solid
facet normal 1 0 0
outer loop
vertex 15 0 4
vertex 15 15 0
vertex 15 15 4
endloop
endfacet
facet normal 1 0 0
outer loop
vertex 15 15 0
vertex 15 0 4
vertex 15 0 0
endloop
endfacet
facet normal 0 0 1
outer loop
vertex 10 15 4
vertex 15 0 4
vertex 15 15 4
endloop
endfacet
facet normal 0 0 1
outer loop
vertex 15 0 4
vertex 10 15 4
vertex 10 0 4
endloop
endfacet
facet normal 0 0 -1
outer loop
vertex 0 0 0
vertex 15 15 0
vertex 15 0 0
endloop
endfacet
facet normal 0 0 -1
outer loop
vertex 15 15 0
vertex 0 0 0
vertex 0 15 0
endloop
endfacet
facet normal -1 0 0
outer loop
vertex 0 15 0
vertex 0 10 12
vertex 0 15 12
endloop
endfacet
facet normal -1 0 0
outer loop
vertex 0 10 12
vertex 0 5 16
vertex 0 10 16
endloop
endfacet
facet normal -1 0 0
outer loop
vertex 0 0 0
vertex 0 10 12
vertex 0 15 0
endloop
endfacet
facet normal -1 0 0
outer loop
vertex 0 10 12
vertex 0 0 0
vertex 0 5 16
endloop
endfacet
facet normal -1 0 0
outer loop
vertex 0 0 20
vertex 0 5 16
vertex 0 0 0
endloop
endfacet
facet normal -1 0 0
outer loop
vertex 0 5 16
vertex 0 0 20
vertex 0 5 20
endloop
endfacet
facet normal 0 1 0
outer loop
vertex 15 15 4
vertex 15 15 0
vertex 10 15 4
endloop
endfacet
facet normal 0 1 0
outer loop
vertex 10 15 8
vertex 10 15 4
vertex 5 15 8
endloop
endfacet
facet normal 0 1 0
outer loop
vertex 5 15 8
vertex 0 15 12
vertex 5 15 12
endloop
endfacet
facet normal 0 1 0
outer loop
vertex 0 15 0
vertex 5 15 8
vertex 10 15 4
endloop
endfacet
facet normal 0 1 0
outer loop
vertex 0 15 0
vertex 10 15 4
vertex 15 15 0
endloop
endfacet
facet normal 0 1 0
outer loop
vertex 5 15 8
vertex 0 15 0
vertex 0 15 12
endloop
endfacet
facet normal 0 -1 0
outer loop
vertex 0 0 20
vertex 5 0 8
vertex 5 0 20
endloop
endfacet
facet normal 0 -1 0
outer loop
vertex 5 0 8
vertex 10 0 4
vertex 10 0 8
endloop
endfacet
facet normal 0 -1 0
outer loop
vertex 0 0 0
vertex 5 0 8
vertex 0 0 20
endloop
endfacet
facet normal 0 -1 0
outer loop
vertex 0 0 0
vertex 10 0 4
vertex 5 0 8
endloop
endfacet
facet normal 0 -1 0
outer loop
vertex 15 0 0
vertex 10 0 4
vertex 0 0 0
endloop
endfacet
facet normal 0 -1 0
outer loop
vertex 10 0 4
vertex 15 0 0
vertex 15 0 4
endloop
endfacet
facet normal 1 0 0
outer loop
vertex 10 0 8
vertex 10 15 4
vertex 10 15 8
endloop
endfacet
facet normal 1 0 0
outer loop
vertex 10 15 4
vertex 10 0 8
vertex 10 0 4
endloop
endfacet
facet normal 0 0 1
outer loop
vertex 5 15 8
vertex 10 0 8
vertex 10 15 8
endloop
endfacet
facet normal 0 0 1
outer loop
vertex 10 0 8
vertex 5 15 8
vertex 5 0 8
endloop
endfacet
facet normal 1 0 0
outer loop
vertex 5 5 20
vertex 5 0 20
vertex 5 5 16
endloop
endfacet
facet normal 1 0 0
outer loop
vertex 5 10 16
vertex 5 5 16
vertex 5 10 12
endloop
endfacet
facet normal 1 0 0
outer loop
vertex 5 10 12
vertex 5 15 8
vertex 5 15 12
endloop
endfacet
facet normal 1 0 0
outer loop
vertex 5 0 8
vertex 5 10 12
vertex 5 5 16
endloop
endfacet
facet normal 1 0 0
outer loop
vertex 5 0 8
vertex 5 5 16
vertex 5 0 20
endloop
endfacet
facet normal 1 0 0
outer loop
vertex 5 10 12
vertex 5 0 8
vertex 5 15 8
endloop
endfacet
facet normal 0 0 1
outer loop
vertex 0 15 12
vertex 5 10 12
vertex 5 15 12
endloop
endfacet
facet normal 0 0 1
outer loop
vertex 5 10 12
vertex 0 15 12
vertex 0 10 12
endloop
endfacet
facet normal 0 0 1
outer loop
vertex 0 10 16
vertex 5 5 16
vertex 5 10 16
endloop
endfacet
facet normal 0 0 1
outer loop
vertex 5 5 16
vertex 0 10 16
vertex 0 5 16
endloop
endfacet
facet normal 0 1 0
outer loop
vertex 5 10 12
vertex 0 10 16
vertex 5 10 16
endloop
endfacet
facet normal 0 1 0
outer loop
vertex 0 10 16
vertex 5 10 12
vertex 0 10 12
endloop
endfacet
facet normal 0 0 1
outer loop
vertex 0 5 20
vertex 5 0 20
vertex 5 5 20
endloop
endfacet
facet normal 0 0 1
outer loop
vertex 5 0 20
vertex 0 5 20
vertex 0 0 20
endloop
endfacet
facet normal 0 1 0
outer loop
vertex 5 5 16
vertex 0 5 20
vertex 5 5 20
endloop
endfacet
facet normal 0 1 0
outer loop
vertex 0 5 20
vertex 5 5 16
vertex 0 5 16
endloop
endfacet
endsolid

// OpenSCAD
//test part for calibrating 3d printer
bissl=1/100;
part="solid";//[solid,holes]
nx=3;
stepx=5;
ny=3;
stepy=5;
nz=nx+ny-1;
stepz=4;
xs=[for (i=[stepx*nx:-stepx:stepx]) i];
ys=[for (i=[stepy*ny:-stepy:stepy]) i];
zs=[for (i=[stepz:stepz:stepz*nz]) i];
echo(zs);
if (part=="solid") {
  for (i=[0:nx-1]) {
    cube([xs[i],ys[0],zs[i]]);
  }
  for (i=[0:ny-1]) {
    echo(ys[i]);
    cube([xs[nx-1],ys[i],zs[nx-1+i]]);
  }
}
if (part=="holes") {
  difference() {
    cube([(nx+1)*stepx,(ny+1)*stepy,max(nx,ny)*stepz],center=true);
    intersection() {
      for (i=[0:nx-1]) translate([0,0,stepz*(1-i)]) cube([xs[i],ys[0],stepz+bissl],center=true);
      for (i=[0:ny-1]) translate([0,0,stepz*(1-i)]) cube([xs[0],ys[i],stepz+bissl],center=true);
    }
  }
}
